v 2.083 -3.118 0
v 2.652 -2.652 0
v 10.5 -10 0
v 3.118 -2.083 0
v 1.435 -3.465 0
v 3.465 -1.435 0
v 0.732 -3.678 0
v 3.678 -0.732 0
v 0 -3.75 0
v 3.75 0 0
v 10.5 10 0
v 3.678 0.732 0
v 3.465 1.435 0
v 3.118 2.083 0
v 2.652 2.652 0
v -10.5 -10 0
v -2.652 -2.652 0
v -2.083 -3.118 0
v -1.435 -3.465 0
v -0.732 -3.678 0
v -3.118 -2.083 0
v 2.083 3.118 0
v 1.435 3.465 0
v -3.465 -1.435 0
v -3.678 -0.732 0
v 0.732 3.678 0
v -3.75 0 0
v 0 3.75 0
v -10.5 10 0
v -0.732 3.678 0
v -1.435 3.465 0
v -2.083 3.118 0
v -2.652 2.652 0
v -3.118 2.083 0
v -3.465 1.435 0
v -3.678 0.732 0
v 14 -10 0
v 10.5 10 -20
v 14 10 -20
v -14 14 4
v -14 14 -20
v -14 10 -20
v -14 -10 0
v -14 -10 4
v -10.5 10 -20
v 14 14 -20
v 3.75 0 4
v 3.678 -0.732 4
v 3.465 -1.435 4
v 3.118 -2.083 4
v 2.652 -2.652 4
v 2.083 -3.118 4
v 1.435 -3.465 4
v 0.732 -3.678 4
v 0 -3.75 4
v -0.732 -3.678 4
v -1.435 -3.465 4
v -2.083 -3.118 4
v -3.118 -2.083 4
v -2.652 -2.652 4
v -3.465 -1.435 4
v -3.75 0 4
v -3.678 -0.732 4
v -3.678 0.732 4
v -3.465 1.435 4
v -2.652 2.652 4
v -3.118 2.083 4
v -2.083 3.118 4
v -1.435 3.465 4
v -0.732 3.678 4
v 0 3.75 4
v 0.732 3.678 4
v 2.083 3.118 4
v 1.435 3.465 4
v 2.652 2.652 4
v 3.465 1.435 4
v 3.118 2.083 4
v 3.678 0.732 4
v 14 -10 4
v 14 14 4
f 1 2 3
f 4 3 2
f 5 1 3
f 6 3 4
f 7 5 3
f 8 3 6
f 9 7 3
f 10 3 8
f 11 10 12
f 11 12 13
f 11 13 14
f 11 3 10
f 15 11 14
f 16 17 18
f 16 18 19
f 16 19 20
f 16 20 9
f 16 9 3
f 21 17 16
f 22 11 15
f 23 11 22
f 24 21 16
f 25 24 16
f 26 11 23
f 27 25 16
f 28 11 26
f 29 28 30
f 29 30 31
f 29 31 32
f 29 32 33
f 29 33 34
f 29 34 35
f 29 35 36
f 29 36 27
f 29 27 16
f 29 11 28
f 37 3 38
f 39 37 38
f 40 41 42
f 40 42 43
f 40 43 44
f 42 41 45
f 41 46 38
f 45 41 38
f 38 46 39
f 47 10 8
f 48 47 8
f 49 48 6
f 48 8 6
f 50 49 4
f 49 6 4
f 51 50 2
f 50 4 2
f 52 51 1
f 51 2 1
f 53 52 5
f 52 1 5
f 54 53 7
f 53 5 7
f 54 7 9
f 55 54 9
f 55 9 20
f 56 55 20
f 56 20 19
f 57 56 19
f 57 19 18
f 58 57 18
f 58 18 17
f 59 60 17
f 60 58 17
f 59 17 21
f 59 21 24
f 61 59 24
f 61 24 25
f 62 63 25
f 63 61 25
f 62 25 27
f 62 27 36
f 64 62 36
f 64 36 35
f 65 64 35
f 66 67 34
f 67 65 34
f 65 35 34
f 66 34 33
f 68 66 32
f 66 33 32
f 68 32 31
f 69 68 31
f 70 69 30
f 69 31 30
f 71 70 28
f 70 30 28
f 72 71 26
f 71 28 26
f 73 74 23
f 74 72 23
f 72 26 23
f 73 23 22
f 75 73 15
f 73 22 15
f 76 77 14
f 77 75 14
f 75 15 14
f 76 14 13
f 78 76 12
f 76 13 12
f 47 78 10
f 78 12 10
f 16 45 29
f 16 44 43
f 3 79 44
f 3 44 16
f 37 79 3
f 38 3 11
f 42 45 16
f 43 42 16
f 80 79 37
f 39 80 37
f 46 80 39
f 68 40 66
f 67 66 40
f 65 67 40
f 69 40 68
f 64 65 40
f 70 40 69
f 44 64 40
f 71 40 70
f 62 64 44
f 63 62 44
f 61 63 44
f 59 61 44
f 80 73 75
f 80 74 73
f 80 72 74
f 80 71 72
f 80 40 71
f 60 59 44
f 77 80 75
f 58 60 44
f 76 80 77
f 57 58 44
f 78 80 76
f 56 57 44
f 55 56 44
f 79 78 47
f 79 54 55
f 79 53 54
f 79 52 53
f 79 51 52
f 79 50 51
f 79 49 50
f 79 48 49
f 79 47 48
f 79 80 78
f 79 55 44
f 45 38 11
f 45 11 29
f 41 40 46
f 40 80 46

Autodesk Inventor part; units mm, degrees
ref_plane "YZ Plane" through (0, 0, 0) normal (1, 0, 0) x (0, 1, 0)
ref_plane "XZ Plane" through (0, 0, 0) normal (0, 1, 0) x (-1, 0, 0)
ref_plane "XY Plane" through (0, 0, 0) normal (0, 0, 1) x (1, 0, 0)
sketch "Sketch1" plane through (0, 0, 0) normal (0, 0, 1) x (1, 0, 0)
  circle A0 centre (0, 0) radius 3.75
  line L0 (-10, 10) -> (10, 10)
  line L1 (10, 10) -> (10, -10)
  line L2 (10, -10) -> (-10, -10)
  line L3 (-10, -10) -> (-10, 10)
  line L4 (-10, 10) -> (10, -10) construction
  line L5 (10, 10) -> (-10, -10) construction
  dimension "d0" = 7.5
  dimension "d1" = 20
  dimension "d2" = 20
extrude "Extrusion1" add sketch "Sketch1" along normal blind 4
sketch "Sketch2" plane through (-10, 10, 0) normal (0, 1, 0) x (1, 0, 0)
  line L0 (20, -4) -> (0, -4) projected
  line L1 (0, -4) -> (20, -4)
  line L2 (20, -4) -> (20, 20)
  line L3 (20, 20) -> (0, 20)
  line L4 (0, 20) -> (0, -4)
  point P0 (10, 0)
  dimension "d5" = 24
extrude "Extrusion2" add sketch "Sketch2" along normal blind 4
sketch "Sketch3" plane through (10, -10, 4) normal (1, 0, 0) x (0, 0, -1)
  line L0 (4, 0) -> (0, 0) projected
  line L1 (4, 20) -> (24, 20) projected
  line L2 (4, 0) -> (24, 20)
  line L3 (24, 20) -> (24, 24) projected
  line L4 (24, 20) -> (24, 24)
  line L5 (24, 24) -> (0, 24) projected
  line L6 (24, 24) -> (0, 24)
  line L7 (0, 0) -> (0, 24) projected
  line L8 (0, 24) -> (0, 0)
  line L9 (0, 0) -> (4, 0)
  point P0 (4, 10)
extrude "Extrusion3" add sketch "Sketch3" along normal blind 4
ref_plane "Work Plane1" through (0, -10, 4) normal (1, 0, 0) x (0, 0, -1)
mirror "Mirror1" about plane through (0, -10, 4) normal (1, 0, 0) of "Extrusion3"
sketch "Sketch4" plane through (14, 10, -20) normal (0, 0, -1) x (-1, 0, 0)
  line L0 (3.5, 0) -> (24.5, 0)
  line L1 (24.5, 0) -> (24.5, -20)
  line L2 (24.5, -20) -> (3.5, -20)
  line L3 (3.5, -20) -> (3.5, 0)
  line L4 (3.5, 0) -> (24.5, -20) construction
  line L5 (24.5, 0) -> (3.5, -20) construction
  point P0 (14, -10)
  dimension "d11" = 21
  dimension "d12" = 20
extrude "Extrusion4" cut sketch "Sketch4" against normal blind 20
properties part number "Gabarito Furo BOX"
